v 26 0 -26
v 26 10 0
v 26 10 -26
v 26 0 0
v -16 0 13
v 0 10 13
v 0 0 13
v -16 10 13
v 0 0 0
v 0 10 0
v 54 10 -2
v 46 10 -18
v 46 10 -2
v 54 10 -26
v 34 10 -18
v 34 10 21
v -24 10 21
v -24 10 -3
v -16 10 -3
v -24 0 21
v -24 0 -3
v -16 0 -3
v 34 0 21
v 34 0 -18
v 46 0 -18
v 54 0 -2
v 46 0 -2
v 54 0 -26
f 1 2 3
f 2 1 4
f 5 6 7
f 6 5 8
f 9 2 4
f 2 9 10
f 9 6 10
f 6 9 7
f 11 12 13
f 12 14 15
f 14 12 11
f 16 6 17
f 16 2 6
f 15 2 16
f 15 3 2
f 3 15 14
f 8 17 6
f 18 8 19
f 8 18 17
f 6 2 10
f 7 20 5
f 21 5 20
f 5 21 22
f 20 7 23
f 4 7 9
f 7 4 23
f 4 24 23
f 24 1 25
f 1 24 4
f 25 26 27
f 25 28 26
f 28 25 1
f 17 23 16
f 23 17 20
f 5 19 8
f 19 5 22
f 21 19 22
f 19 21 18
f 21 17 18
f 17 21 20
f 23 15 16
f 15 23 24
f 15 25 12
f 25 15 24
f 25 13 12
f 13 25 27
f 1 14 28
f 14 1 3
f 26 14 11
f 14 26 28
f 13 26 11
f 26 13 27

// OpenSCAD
//Tiefe Würfel 1
x=26;
//Breite Haken
y=10;
//Höhe Würfel 1
z=13;

//Dicke Türrahmen
a=16;

//Thickness
t=8;

//Länge Haken
l=x-t;
//Tiefe Haken
th=t*2.5;
//Höhe Haken vorne
hh=t*3;

module wuerfel1()
{
    cube([x,y,z]);
}

module oben()
{
    color("green")
    translate([-a,0,z])
    cube([x+a,y,t]);
}

module hinten()
{
    color("blue")
    translate([-a-t,0,-(hh-z-t)])
    cube([t,y,hh]);
}

module vorne()
{
    color("orange")
    translate([x,0,-l])
    cube([t,y,z+t+l]);
}

module unten()
{
    color("yellow")
    translate([x,0,-l-t])
    cube([th,y,t]);
}

module hakenvorne()
{
    color("purple")
    translate([x+th,0,-l-t])
    cube([t,y,hh]);
}

wuerfel1();
oben();
hinten();
vorne();
unten();
hakenvorne();
